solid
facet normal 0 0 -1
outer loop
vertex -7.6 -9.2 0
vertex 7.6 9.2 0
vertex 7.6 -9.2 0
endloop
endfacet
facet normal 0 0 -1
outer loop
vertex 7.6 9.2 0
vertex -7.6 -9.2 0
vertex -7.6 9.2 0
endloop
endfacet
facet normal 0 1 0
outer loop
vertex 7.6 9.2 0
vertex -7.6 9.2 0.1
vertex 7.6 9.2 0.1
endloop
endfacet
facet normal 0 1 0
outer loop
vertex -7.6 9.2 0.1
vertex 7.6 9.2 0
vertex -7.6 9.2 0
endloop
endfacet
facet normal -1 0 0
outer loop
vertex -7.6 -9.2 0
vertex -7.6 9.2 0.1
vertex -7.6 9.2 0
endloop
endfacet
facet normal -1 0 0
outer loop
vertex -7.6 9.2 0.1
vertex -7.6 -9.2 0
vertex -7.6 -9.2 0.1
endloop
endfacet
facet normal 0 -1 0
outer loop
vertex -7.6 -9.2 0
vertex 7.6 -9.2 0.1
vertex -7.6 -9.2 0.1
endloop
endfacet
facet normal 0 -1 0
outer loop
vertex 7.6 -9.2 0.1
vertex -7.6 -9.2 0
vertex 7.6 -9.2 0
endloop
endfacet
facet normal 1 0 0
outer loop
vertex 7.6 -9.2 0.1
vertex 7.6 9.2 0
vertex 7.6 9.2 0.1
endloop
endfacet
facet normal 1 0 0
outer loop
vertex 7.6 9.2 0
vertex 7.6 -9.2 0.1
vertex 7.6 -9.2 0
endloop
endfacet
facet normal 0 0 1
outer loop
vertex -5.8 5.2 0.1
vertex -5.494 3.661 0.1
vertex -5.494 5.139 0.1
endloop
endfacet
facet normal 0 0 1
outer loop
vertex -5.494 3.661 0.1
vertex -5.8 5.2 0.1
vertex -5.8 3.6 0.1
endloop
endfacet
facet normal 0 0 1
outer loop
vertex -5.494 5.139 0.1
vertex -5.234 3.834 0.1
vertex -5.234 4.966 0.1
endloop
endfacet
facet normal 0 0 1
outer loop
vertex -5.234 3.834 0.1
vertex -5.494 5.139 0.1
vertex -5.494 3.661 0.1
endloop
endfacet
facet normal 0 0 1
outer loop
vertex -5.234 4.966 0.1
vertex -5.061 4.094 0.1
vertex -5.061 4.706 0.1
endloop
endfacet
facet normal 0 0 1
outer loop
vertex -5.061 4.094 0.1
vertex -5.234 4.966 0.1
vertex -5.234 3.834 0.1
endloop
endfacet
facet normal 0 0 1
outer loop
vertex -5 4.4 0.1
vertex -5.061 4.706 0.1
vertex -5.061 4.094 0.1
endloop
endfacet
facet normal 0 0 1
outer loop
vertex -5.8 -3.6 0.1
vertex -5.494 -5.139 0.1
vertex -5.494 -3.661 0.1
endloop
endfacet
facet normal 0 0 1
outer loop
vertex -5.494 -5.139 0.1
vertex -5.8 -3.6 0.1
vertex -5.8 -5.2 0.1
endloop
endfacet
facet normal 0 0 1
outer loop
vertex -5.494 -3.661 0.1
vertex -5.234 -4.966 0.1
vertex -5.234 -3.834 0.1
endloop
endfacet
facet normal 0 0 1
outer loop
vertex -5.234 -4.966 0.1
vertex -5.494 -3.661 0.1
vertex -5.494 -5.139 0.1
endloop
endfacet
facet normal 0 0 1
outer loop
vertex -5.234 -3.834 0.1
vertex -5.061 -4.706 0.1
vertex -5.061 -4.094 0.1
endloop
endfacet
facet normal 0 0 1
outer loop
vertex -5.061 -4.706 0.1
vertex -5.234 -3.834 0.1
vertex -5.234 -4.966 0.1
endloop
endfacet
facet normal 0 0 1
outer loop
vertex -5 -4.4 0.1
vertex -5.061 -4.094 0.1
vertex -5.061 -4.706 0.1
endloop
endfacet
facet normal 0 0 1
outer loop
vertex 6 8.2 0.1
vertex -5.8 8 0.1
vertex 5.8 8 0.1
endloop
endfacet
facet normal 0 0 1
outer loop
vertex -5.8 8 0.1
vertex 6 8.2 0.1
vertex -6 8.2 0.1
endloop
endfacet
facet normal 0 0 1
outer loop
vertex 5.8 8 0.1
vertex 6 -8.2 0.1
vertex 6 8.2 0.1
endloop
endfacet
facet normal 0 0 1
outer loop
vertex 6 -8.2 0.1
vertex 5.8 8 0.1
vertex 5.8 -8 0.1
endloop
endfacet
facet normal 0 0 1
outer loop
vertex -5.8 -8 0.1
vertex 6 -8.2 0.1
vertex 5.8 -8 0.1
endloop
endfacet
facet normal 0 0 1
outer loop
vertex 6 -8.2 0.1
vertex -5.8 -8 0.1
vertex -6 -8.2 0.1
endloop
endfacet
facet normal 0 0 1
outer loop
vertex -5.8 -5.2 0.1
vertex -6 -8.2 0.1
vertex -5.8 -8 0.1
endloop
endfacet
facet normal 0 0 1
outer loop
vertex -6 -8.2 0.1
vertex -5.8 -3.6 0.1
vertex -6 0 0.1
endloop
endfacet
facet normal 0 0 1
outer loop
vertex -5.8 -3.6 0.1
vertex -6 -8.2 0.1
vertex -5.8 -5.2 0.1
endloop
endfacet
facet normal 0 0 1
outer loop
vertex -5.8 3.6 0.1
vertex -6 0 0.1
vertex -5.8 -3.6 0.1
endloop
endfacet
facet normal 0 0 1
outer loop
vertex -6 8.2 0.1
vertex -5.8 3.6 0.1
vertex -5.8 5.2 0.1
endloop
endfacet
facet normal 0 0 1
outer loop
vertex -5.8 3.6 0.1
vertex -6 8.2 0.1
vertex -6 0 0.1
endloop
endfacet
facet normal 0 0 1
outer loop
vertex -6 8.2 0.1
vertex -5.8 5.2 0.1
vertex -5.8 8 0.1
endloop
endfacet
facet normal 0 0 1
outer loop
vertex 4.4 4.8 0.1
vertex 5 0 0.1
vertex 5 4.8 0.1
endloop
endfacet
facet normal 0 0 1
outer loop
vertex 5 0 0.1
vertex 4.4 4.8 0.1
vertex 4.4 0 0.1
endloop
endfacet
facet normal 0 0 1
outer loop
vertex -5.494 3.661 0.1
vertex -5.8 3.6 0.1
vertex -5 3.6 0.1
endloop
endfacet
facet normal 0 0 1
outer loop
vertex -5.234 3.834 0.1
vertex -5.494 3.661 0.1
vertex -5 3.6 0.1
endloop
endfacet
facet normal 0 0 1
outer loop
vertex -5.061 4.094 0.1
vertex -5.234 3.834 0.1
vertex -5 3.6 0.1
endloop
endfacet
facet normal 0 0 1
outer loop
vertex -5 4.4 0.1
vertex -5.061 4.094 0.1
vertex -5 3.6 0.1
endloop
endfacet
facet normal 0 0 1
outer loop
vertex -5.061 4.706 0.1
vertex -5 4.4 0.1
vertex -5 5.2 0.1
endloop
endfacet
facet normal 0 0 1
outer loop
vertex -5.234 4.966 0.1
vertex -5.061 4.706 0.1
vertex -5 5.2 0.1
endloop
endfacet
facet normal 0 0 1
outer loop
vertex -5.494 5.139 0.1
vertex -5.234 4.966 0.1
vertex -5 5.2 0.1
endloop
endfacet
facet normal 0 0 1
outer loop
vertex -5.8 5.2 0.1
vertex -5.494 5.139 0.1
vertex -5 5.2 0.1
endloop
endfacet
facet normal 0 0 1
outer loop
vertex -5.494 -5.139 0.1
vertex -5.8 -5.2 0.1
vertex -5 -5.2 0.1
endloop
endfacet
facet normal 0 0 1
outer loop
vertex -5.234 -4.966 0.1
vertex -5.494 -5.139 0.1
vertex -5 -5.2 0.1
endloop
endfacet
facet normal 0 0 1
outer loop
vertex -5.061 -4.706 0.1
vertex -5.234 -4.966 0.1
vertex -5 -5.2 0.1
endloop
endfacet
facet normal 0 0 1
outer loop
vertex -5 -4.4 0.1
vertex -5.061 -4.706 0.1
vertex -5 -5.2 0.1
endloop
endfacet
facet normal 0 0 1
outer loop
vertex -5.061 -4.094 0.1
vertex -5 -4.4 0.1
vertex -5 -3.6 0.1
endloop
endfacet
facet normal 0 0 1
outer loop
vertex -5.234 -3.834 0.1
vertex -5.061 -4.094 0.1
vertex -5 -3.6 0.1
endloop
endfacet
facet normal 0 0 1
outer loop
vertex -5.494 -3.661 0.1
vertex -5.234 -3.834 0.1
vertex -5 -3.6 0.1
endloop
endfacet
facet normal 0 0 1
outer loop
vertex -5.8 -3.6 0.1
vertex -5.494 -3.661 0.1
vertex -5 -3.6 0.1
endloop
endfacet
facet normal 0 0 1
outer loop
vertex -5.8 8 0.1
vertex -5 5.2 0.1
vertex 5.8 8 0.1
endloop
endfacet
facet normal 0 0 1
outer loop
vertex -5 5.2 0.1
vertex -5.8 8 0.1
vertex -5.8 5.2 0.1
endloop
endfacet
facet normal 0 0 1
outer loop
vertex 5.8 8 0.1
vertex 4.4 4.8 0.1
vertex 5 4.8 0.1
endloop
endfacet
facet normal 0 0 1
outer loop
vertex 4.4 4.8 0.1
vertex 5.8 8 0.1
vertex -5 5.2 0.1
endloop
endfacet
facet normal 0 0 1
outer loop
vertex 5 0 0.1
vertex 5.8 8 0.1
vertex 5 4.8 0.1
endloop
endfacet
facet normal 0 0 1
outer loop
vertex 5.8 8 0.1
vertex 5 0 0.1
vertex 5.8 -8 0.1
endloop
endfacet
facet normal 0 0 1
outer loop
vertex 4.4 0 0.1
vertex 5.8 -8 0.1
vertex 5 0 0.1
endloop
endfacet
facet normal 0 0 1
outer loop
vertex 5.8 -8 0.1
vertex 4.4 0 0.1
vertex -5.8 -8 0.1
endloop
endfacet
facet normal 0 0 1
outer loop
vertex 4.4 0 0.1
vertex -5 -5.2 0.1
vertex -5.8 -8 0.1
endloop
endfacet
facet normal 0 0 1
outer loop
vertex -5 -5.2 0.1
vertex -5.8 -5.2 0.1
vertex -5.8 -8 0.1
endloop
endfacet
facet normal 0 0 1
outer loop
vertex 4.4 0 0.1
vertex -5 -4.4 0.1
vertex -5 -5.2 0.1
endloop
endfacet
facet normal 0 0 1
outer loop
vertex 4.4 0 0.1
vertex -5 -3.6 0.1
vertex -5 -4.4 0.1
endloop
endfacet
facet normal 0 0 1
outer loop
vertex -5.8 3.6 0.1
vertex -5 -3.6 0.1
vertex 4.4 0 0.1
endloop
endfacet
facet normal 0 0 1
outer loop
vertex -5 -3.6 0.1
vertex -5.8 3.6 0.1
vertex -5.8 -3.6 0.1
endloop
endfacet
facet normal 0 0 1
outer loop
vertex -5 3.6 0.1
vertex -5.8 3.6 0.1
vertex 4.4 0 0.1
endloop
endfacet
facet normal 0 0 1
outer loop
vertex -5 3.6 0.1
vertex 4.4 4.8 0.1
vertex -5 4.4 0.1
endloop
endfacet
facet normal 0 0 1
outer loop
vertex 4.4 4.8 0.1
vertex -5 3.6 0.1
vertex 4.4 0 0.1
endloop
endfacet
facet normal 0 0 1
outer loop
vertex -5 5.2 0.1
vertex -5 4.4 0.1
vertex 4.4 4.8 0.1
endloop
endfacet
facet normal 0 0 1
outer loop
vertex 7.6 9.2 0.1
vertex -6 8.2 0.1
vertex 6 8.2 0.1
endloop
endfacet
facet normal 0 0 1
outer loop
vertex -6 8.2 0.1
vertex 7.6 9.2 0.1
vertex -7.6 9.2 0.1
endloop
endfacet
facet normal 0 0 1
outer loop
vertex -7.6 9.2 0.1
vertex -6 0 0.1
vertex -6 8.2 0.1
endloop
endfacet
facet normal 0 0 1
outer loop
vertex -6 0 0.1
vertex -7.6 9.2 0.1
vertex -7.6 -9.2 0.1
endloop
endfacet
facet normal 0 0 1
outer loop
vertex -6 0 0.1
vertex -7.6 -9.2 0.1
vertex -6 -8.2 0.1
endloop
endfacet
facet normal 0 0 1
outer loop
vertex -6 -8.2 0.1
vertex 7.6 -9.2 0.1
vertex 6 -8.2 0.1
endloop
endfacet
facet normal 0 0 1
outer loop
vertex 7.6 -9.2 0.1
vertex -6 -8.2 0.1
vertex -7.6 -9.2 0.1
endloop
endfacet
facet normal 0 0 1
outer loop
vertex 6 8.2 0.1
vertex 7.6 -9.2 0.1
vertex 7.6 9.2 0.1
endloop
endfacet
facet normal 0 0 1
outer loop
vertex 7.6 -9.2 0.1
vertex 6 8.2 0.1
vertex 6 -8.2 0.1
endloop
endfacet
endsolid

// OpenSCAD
// file: ../p/box5-12.scad
use <../lib.scad>
function ldraw_lib__box5_12() = [
// 0 Box with 5 Faces without Any Edges
// 0 Name: box5-12.dat
// 0 Author: Chris Dee [cwdee]
// 0 !LDRAW_ORG Primitive UPDATE 2009-02
// 0 !LICENSE Licensed under CC BY 4.0 : see CAreadme.txt
// 
// 0 BFC CERTIFY CCW
  [0,"BFC","CERTIFY"],
  [0,"BFC","CCW"],
// 
// 0 !HISTORY 2009-09-03 [PTadmin] Official Update 2009-02
// 
// 
// 4 16 1 1 1 1 1 -1 -1 1 -1 -1 1 1
  [4,16,1,1,1,1,1,-1,-1,1,-1,-1,1,1],
// 4 16 -1 0 1 1 0 1 1 1 1 -1 1 1
  [4,16,-1,0,1,1,0,1,1,1,1,-1,1,1],
// 4 16 -1 0 -1 -1 0 1 -1 1 1 -1 1 -1
  [4,16,-1,0,-1,-1,0,1,-1,1,1,-1,1,-1],
// 4 16 1 0 -1 -1 0 -1 -1 1 -1 1 1 -1
  [4,16,1,0,-1,-1,0,-1,-1,1,-1,1,1,-1],
// 4 16 1 0 1 1 0 -1 1 1 -1 1 1 1
  [4,16,1,0,1,1,0,-1,1,1,-1,1,1,1],
// 0
];
module ldraw_lib__box5_12(step=0, col=false, unit=2/5, alt=false, line=0.2, solid=!$preview)
    makepoly(ldraw_lib__box5_12(), step=step, col=col, unit=unit, alt=alt, line=line, solid=solid);
ldraw_lib__box5_12(line=0.2);
// file: ../p/2-4ndis.scad
use <../lib.scad>
function ldraw_lib__2_4ndis() = [
// 0 Disc Negative 0.5
// 0 Name: 2-4ndis.dat
// 0 Author: James Jessiman
// 0 !LDRAW_ORG Primitive UPDATE 2012-01
// 0 !LICENSE Licensed under CC BY 4.0 : see CAreadme.txt
// 
// 0 BFC CERTIFY CCW
  [0,"BFC","CERTIFY"],
  [0,"BFC","CCW"],
// 
// 0 !HISTORY 2002-03-23 [sbliss] Added BFC statement; compacted code
// 0 !HISTORY 2002-04-25 [PTadmin] Official Update 2002-02
// 0 !HISTORY 2007-06-24 [PTadmin] Header formatted for Contributor Agreement
// 0 !HISTORY 2008-07-01 [PTadmin] Official Update 2008-01
// 0 !HISTORY 2012-02-16 [Philo] Changed to CCW
// 0 !HISTORY 2012-03-30 [PTadmin] Official Update 2012-01
// 
// 
// 3 16 0.9239 0 0.3827 1 0 0 1 0 1
  [3,16,0.9239,0,0.3827,1,0,0,1,0,1],
// 3 16 0.7071 0 0.7071 0.9239 0 0.3827 1 0 1
  [3,16,0.7071,0,0.7071,0.9239,0,0.3827,1,0,1],
// 3 16 0.3827 0 0.9239 0.7071 0 0.7071 1 0 1
  [3,16,0.3827,0,0.9239,0.7071,0,0.7071,1,0,1],
// 3 16 0 0 1 0.3827 0 0.9239 1 0 1
  [3,16,0,0,1,0.3827,0,0.9239,1,0,1],
// 3 16 -0.3827 0 0.9239 0 0 1 -1 0 1
  [3,16,-0.3827,0,0.9239,0,0,1,-1,0,1],
// 3 16 -0.7071 0 0.7071 -0.3827 0 0.9239 -1 0 1
  [3,16,-0.7071,0,0.7071,-0.3827,0,0.9239,-1,0,1],
// 3 16 -0.9239 0 0.3827 -0.7071 0 0.7071 -1 0 1
  [3,16,-0.9239,0,0.3827,-0.7071,0,0.7071,-1,0,1],
// 3 16 -1 0 0 -0.9239 0 0.3827 -1 0 1
  [3,16,-1,0,0,-0.9239,0,0.3827,-1,0,1],
];
module ldraw_lib__2_4ndis(step=0, col=false, unit=2/5, alt=false, line=0.2, solid=!$preview)
    makepoly(ldraw_lib__2_4ndis(), step=step, col=col, unit=unit, alt=alt, line=line, solid=solid);
ldraw_lib__2_4ndis(line=0.2);
// file: ../p/2-4chrd.scad
use <../lib.scad>
function ldraw_lib__2_4chrd() = [
// 0 Chord 0.5
// 0 Name: 2-4chrd.dat
// 0 Author: Philippe Hurbain [Philo]
// 0 !LDRAW_ORG Primitive UPDATE 2014-01
// 0 !LICENSE Licensed under CC BY 4.0 : see CAreadme.txt
// 
// 0 BFC CERTIFY CCW
  [0,"BFC","CERTIFY"],
  [0,"BFC","CCW"],
// 
// 0 !HISTORY 2014-06-21 [PTadmin] Official Update 2014-01
// 
// 
// 4 16 0.9239 0 0.3827 -0.9239 0 0.3827 -1 0 0 1 0 0
  [4,16,0.9239,0,0.3827,-0.9239,0,0.3827,-1,0,0,1,0,0],
// 4 16 0.7071 0 0.7071 -0.7071 0 0.7071 -0.9239 0 0.3827 0.9239 0 0.3827
  [4,16,0.7071,0,0.7071,-0.7071,0,0.7071,-0.9239,0,0.3827,0.9239,0,0.3827],
// 4 16 0.3827 0 0.9239 -0.3827 0 0.9239 -0.7071 0 0.7071 0.7071 0 0.7071
  [4,16,0.3827,0,0.9239,-0.3827,0,0.9239,-0.7071,0,0.7071,0.7071,0,0.7071],
// 3 16 0 0 1 -0.3827 0 0.9239 0.3827 0 0.9239
  [3,16,0,0,1,-0.3827,0,0.9239,0.3827,0,0.9239],
];
module ldraw_lib__2_4chrd(step=0, col=false, unit=2/5, alt=false, line=0.2, solid=!$preview)
    makepoly(ldraw_lib__2_4chrd(), step=step, col=col, unit=unit, alt=alt, line=line, solid=solid);
ldraw_lib__2_4chrd(line=0.2);
// main file
use <../lib.scad>
use <../p/2-4chrd.scad>
use <../p/2-4ndis.scad>
use <../p/box5-12.scad>
function ldraw_lib__194325d() = [
// 0 Sticker  2.3 x  1.9 with Refrigerator Door
// 0 Name: 194325d.dat
// 0 Author: Takeshi Takahashi [RainbowDolphin]
// 0 !LDRAW_ORG Part UPDATE 2024-08
// 0 !LICENSE Licensed under CC BY 4.0 : see CAreadme.txt
// 
// 0 BFC CERTIFY CCW
  [0,"BFC","CERTIFY"],
  [0,"BFC","CCW"],
// 
// 0 !KEYWORDS cupboard, Kitchen, set 6372
// 
// 0 !HISTORY 2024-09-30 [OrionP] Official Update 2024-08
// 
// 
// 1 16 0 -0.25 0 19 0 0 0 0.25 0 0 0 23 box5-12.dat
  [1,16,0,-0.25,0,19,0,0,0,0.25,0,0,0,23, ldraw_lib__box5_12()],
// 0 BFC NOCLIP
  [0,"BFC","NOCLIP"],
// 1 0 -14.5 -0.25 11 0 0 2 0 1 0 -2 0 0 2-4chrd.dat
  [1,0,-14.5,-0.25,11,0,0,2,0,1,0,-2,0,0, ldraw_lib__2_4chrd()],
// 1 0 -14.5 -0.25 -11 0 0 2 0 1 0 -2 0 0 2-4chrd.dat
  [1,0,-14.5,-0.25,-11,0,0,2,0,1,0,-2,0,0, ldraw_lib__2_4chrd()],
// 4 0 -15 -0.25 20.5 -14.5 -0.25 20 14.5 -0.25 20 15 -0.25 20.5
  [4,0,-15,-0.25,20.5,-14.5,-0.25,20,14.5,-0.25,20,15,-0.25,20.5],
// 4 0 15 -0.25 -20.5 15 -0.25 20.5 14.5 -0.25 20 14.5 -0.25 -20
  [4,0,15,-0.25,-20.5,15,-0.25,20.5,14.5,-0.25,20,14.5,-0.25,-20],
// 4 0 15 -0.25 -20.5 14.5 -0.25 -20 -14.5 -0.25 -20 -15 -0.25 -20.5
  [4,0,15,-0.25,-20.5,14.5,-0.25,-20,-14.5,-0.25,-20,-15,-0.25,-20.5],
// 3 0 -14.5 -0.25 -13 -15 -0.25 -20.5 -14.5 -0.25 -20
  [3,0,-14.5,-0.25,-13,-15,-0.25,-20.5,-14.5,-0.25,-20],
// 4 0 -15 -0.25 -20.5 -14.5 -0.25 -13 -14.5 -0.25 -9 -15 -0.25 0
  [4,0,-15,-0.25,-20.5,-14.5,-0.25,-13,-14.5,-0.25,-9,-15,-0.25,0],
// 3 0 -14.5 -0.25 9 -15 -0.25 0 -14.5 -0.25 -9
  [3,0,-14.5,-0.25,9,-15,-0.25,0,-14.5,-0.25,-9],
// 4 0 -15 -0.25 0 -14.5 -0.25 9 -14.5 -0.25 13 -15 -0.25 20.5
  [4,0,-15,-0.25,0,-14.5,-0.25,9,-14.5,-0.25,13,-15,-0.25,20.5],
// 3 0 -15 -0.25 20.5 -14.5 -0.25 13 -14.5 -0.25 20
  [3,0,-15,-0.25,20.5,-14.5,-0.25,13,-14.5,-0.25,20],
// 4 0 12.5 -0.25 12 11 -0.25 12 11 -0.25 0 12.5 -0.25 0
  [4,0,12.5,-0.25,12,11,-0.25,12,11,-0.25,0,12.5,-0.25,0],
// 0 BFC CLIP
  [0,"BFC","CLIP"],
// 1 16 -14.5 -0.25 11 0 0 2 0 1 0 -2 0 0 2-4ndis.dat
  [1,16,-14.5,-0.25,11,0,0,2,0,1,0,-2,0,0, ldraw_lib__2_4ndis()],
// 1 16 -14.5 -0.25 -11 0 0 2 0 1 0 -2 0 0 2-4ndis.dat
  [1,16,-14.5,-0.25,-11,0,0,2,0,1,0,-2,0,0, ldraw_lib__2_4ndis()],
// 4 16 14.5 -0.25 20 -14.5 -0.25 20 -14.5 -0.25 13 -12.5 -0.25 13
  [4,16,14.5,-0.25,20,-14.5,-0.25,20,-14.5,-0.25,13,-12.5,-0.25,13],
// 4 16 14.5 -0.25 20 -12.5 -0.25 13 11 -0.25 12 12.5 -0.25 12
  [4,16,14.5,-0.25,20,-12.5,-0.25,13,11,-0.25,12,12.5,-0.25,12],
// 4 16 14.5 -0.25 20 12.5 -0.25 12 12.5 -0.25 0 14.5 -0.25 -20
  [4,16,14.5,-0.25,20,12.5,-0.25,12,12.5,-0.25,0,14.5,-0.25,-20],
// 4 16 14.5 -0.25 -20 12.5 -0.25 0 11 -0.25 0 -14.5 -0.25 -20
  [4,16,14.5,-0.25,-20,12.5,-0.25,0,11,-0.25,0,-14.5,-0.25,-20],
// 3 16 11 -0.25 0 -12.5 -0.25 -13 -14.5 -0.25 -20
  [3,16,11,-0.25,0,-12.5,-0.25,-13,-14.5,-0.25,-20],
// 3 16 -12.5 -0.25 -13 -14.5 -0.25 -13 -14.5 -0.25 -20
  [3,16,-12.5,-0.25,-13,-14.5,-0.25,-13,-14.5,-0.25,-20],
// 3 16 11 -0.25 0 -12.5 -0.25 -11 -12.5 -0.25 -13
  [3,16,11,-0.25,0,-12.5,-0.25,-11,-12.5,-0.25,-13],
// 3 16 11 -0.25 0 -12.5 -0.25 -9 -12.5 -0.25 -11
  [3,16,11,-0.25,0,-12.5,-0.25,-9,-12.5,-0.25,-11],
// 4 16 -14.5 -0.25 -9 -12.5 -0.25 -9 11 -0.25 0 -14.5 -0.25 9
  [4,16,-14.5,-0.25,-9,-12.5,-0.25,-9,11,-0.25,0,-14.5,-0.25,9],
// 3 16 -12.5 -0.25 9 -14.5 -0.25 9 11 -0.25 0
  [3,16,-12.5,-0.25,9,-14.5,-0.25,9,11,-0.25,0],
// 4 16 -12.5 -0.25 9 11 -0.25 0 11 -0.25 12 -12.5 -0.25 11
  [4,16,-12.5,-0.25,9,11,-0.25,0,11,-0.25,12,-12.5,-0.25,11],
// 3 16 -12.5 -0.25 13 -12.5 -0.25 11 11 -0.25 12
  [3,16,-12.5,-0.25,13,-12.5,-0.25,11,11,-0.25,12],
// 4 16 15 -0.25 20.5 19 -0.25 23 -19 -0.25 23 -15 -0.25 20.5
  [4,16,15,-0.25,20.5,19,-0.25,23,-19,-0.25,23,-15,-0.25,20.5],
// 4 16 -15 -0.25 0 -15 -0.25 20.5 -19 -0.25 23 -19 -0.25 -23
  [4,16,-15,-0.25,0,-15,-0.25,20.5,-19,-0.25,23,-19,-0.25,-23],
// 3 16 -15 -0.25 0 -19 -0.25 -23 -15 -0.25 -20.5
  [3,16,-15,-0.25,0,-19,-0.25,-23,-15,-0.25,-20.5],
// 4 16 15 -0.25 -20.5 -15 -0.25 -20.5 -19 -0.25 -23 19 -0.25 -23
  [4,16,15,-0.25,-20.5,-15,-0.25,-20.5,-19,-0.25,-23,19,-0.25,-23],
// 4 16 15 -0.25 20.5 15 -0.25 -20.5 19 -0.25 -23 19 -0.25 23
  [4,16,15,-0.25,20.5,15,-0.25,-20.5,19,-0.25,-23,19,-0.25,23],
];
module ldraw_lib__194325d(step=0, col=false, unit=2/5, alt=false, line=0.2, solid=!$preview)
    makepoly(ldraw_lib__194325d(), step=step, col=col, unit=unit, alt=alt, line=line, solid=solid);
ldraw_lib__194325d(line=0.2);
